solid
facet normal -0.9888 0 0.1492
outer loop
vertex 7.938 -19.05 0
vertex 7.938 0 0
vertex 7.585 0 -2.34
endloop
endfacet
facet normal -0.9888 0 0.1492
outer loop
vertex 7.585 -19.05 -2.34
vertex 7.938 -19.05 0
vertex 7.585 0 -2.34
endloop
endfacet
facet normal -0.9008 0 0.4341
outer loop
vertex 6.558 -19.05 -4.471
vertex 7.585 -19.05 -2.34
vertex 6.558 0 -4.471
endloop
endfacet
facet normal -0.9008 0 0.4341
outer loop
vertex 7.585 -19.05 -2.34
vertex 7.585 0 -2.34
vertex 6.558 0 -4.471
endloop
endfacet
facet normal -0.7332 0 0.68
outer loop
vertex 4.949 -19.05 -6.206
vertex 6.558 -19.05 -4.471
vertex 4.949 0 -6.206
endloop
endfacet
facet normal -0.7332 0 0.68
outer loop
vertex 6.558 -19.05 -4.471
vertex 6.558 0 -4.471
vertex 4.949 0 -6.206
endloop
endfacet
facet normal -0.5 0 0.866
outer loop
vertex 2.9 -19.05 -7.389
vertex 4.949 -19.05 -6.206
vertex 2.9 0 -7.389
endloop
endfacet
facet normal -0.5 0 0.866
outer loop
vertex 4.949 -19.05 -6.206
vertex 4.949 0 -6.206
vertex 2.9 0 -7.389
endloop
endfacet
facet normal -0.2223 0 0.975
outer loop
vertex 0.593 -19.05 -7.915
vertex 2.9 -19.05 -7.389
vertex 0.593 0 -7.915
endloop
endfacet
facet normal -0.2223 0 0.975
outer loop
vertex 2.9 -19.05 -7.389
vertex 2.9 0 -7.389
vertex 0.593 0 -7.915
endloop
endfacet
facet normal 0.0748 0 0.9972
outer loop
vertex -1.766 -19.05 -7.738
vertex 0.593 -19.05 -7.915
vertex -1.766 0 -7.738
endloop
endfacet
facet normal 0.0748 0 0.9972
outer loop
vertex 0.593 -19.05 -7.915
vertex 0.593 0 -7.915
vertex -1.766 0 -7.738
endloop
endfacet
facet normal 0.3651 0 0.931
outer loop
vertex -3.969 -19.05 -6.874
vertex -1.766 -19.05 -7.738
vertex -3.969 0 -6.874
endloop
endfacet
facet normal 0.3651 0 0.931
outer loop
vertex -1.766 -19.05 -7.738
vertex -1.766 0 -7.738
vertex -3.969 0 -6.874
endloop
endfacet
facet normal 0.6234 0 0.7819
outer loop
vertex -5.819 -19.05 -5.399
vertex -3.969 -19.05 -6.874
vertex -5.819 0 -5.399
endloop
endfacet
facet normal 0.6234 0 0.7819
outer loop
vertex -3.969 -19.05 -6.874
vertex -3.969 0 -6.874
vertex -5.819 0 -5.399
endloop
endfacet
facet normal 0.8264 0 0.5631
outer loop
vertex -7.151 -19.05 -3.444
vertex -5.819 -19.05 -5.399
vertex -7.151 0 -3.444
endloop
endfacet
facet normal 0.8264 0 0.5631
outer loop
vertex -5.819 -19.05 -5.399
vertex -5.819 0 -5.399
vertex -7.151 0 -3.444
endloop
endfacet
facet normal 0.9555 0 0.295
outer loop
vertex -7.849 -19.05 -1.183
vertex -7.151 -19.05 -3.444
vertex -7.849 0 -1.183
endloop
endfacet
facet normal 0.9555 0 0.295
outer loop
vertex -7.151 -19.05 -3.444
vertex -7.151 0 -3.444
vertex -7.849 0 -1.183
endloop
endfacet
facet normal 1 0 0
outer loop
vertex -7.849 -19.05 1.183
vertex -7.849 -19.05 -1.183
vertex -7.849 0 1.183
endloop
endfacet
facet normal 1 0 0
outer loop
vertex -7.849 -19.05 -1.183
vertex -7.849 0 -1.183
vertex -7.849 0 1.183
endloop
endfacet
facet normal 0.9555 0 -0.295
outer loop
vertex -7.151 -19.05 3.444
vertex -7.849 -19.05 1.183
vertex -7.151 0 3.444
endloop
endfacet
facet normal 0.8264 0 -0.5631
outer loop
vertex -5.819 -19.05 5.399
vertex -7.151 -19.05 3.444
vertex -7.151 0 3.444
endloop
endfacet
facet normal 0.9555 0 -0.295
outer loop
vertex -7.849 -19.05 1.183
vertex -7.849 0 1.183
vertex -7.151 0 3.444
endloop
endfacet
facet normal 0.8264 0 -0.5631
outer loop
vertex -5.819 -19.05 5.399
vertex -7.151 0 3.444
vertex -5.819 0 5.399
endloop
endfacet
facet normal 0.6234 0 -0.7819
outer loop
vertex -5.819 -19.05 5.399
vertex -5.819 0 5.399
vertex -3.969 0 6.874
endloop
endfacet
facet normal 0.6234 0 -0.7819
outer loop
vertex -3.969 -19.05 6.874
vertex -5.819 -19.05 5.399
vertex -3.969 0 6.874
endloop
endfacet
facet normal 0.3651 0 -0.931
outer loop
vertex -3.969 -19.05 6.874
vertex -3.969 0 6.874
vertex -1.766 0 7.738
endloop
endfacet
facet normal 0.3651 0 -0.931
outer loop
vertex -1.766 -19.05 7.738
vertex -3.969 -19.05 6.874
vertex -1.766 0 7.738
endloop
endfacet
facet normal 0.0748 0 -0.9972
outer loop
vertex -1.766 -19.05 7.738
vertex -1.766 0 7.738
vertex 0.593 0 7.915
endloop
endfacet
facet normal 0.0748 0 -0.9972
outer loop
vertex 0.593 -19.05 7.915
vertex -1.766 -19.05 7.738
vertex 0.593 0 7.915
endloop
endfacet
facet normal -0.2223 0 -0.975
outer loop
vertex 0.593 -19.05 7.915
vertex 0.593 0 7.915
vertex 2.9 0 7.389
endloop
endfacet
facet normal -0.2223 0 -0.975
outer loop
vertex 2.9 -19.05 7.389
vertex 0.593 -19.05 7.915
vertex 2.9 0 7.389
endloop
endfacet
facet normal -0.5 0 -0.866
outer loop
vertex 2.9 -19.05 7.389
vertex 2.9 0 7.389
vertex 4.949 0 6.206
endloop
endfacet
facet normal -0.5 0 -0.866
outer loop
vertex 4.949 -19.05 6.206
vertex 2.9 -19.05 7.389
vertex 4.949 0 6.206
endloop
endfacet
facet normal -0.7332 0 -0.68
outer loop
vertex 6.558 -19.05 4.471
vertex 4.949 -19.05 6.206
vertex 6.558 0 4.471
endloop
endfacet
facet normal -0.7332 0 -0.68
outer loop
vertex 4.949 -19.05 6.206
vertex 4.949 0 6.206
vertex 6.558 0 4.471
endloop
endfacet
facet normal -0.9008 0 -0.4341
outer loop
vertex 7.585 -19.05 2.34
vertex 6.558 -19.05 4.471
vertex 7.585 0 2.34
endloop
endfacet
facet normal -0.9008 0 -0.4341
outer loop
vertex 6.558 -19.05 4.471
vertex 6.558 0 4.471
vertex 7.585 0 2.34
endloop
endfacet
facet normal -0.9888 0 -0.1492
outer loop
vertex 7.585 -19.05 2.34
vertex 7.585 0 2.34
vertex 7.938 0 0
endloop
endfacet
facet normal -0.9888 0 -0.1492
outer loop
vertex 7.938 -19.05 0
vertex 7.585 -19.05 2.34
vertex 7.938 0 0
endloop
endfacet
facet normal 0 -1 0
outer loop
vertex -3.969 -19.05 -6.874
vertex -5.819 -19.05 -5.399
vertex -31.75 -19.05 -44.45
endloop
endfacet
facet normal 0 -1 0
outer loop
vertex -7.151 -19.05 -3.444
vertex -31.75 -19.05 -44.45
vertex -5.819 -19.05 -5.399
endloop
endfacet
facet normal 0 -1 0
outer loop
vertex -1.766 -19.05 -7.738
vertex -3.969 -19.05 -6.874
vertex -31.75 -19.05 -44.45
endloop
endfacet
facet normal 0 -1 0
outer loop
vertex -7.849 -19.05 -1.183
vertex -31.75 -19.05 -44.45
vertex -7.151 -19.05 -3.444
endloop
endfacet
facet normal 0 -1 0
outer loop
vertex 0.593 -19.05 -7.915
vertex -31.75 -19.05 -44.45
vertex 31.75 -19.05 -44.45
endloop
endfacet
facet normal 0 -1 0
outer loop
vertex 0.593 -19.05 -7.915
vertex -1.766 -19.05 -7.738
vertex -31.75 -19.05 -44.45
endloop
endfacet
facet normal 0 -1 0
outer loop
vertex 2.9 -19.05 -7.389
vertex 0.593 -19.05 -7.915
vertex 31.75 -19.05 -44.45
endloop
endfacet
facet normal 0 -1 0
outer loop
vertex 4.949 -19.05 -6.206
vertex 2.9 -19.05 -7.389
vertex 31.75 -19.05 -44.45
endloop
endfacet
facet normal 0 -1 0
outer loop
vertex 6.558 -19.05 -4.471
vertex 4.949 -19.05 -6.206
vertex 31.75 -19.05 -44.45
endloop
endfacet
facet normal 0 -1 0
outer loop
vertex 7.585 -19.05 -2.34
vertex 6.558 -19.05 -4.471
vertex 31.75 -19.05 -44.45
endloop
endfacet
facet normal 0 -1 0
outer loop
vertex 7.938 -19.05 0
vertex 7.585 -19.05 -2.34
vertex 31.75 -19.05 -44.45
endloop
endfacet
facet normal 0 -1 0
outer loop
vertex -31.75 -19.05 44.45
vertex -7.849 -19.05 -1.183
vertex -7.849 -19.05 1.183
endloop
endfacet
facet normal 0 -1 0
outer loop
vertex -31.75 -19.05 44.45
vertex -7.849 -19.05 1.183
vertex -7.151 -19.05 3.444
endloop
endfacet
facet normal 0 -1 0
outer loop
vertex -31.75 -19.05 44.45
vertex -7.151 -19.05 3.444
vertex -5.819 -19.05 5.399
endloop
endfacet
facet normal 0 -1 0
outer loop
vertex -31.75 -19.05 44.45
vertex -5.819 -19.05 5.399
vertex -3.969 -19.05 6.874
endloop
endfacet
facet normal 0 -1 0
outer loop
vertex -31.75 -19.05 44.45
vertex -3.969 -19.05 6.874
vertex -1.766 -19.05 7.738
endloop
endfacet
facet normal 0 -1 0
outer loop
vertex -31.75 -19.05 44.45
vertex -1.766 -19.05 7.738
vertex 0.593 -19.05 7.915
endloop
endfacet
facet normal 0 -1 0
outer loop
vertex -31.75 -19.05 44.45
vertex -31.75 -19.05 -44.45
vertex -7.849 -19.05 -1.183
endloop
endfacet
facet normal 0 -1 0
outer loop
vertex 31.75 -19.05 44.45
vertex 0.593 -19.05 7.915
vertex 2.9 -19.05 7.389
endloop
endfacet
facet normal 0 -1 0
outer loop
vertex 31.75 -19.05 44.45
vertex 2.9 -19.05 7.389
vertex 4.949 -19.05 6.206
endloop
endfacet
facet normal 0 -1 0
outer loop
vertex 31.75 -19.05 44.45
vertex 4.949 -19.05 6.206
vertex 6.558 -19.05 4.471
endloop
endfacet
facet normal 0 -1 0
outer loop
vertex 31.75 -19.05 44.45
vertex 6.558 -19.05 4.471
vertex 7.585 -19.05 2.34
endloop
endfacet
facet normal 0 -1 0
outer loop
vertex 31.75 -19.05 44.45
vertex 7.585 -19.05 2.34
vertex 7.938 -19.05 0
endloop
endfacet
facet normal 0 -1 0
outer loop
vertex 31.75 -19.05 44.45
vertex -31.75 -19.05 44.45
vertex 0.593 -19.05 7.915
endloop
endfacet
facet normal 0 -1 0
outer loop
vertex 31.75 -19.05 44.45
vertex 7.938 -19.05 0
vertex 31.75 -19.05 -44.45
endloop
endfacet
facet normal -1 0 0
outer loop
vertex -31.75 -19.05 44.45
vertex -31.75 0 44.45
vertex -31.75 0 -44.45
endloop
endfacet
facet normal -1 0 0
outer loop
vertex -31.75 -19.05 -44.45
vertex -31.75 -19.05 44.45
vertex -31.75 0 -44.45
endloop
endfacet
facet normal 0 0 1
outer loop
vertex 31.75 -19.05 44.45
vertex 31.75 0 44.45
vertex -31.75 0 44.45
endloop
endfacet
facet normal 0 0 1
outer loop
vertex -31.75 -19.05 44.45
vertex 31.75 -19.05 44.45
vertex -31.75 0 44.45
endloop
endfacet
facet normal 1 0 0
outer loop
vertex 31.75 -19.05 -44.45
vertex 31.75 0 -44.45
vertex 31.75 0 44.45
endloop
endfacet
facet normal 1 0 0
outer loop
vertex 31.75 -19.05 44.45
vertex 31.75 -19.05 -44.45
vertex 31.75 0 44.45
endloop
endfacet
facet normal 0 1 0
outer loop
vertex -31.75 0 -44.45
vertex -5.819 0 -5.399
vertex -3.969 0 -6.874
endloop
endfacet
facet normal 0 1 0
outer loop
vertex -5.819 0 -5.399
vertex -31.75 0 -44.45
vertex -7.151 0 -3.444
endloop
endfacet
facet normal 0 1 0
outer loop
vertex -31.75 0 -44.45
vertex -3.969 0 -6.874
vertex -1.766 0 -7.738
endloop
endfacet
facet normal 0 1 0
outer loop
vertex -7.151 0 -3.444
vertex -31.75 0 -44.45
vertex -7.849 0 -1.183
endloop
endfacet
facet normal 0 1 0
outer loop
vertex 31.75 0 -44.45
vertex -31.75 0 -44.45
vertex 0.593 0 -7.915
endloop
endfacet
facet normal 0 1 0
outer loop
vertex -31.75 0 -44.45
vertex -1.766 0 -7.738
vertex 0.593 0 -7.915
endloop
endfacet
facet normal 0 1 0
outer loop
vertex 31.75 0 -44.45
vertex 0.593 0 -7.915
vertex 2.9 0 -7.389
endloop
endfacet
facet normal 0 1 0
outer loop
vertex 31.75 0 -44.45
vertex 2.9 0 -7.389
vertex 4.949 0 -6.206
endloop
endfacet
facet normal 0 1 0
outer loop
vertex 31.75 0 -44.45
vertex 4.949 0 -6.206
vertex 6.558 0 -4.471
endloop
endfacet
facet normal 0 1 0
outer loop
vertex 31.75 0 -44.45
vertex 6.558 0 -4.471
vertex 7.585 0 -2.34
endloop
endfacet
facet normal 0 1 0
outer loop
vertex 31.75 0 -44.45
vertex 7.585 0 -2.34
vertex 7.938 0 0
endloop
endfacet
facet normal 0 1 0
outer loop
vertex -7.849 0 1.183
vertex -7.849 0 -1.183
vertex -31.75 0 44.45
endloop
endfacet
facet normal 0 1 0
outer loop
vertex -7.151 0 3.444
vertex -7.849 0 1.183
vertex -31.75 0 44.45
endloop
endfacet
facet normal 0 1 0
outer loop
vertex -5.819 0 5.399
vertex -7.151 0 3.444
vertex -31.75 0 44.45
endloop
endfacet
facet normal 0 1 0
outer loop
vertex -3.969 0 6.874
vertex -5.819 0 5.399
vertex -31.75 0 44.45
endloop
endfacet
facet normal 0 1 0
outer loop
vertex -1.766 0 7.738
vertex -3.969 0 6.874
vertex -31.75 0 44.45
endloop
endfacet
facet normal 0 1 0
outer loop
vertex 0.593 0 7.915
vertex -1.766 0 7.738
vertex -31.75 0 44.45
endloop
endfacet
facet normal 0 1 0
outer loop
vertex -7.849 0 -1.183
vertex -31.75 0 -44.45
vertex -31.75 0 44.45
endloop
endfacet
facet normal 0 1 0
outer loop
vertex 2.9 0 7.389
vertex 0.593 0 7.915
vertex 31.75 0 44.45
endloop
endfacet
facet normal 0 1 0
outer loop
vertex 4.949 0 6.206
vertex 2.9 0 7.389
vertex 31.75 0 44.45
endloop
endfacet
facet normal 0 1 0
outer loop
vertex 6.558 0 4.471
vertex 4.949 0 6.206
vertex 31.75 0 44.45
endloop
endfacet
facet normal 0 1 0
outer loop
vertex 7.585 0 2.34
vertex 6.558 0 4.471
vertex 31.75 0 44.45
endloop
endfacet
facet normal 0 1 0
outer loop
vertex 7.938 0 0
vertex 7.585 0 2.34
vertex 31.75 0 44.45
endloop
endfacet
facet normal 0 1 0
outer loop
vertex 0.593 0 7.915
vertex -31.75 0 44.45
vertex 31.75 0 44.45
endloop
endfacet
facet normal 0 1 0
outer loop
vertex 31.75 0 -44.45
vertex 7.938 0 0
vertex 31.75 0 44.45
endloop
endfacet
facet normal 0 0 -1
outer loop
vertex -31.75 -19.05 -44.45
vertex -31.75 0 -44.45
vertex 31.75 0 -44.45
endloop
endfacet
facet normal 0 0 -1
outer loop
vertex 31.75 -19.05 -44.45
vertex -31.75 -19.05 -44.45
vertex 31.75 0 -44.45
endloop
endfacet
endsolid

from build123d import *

# Parameters (mm, degrees)
F2_DEPTH = 19.05


with BuildPart() as f2:
    # F1 (on face) → F2 (new body)
    with BuildSketch(Plane.XZ):
        Polygon((-31.75, 44.45), (-31.75, 0), (-31.75, -44.45), (0, -44.45), (31.75, -44.45), (31.75, 0), (31.75, 44.45), (0, 44.45), align=None)
        with BuildLine():
            ThreePointArc((-7.9375, 0), (0, 7.9375), (7.9375, 0))
            ThreePointArc((7.9375, 0), (0, -7.9375), (-7.9375, 0))
        make_face(mode=Mode.SUBTRACT)
    extrude(amount=F2_DEPTH)


solid = f2.part
